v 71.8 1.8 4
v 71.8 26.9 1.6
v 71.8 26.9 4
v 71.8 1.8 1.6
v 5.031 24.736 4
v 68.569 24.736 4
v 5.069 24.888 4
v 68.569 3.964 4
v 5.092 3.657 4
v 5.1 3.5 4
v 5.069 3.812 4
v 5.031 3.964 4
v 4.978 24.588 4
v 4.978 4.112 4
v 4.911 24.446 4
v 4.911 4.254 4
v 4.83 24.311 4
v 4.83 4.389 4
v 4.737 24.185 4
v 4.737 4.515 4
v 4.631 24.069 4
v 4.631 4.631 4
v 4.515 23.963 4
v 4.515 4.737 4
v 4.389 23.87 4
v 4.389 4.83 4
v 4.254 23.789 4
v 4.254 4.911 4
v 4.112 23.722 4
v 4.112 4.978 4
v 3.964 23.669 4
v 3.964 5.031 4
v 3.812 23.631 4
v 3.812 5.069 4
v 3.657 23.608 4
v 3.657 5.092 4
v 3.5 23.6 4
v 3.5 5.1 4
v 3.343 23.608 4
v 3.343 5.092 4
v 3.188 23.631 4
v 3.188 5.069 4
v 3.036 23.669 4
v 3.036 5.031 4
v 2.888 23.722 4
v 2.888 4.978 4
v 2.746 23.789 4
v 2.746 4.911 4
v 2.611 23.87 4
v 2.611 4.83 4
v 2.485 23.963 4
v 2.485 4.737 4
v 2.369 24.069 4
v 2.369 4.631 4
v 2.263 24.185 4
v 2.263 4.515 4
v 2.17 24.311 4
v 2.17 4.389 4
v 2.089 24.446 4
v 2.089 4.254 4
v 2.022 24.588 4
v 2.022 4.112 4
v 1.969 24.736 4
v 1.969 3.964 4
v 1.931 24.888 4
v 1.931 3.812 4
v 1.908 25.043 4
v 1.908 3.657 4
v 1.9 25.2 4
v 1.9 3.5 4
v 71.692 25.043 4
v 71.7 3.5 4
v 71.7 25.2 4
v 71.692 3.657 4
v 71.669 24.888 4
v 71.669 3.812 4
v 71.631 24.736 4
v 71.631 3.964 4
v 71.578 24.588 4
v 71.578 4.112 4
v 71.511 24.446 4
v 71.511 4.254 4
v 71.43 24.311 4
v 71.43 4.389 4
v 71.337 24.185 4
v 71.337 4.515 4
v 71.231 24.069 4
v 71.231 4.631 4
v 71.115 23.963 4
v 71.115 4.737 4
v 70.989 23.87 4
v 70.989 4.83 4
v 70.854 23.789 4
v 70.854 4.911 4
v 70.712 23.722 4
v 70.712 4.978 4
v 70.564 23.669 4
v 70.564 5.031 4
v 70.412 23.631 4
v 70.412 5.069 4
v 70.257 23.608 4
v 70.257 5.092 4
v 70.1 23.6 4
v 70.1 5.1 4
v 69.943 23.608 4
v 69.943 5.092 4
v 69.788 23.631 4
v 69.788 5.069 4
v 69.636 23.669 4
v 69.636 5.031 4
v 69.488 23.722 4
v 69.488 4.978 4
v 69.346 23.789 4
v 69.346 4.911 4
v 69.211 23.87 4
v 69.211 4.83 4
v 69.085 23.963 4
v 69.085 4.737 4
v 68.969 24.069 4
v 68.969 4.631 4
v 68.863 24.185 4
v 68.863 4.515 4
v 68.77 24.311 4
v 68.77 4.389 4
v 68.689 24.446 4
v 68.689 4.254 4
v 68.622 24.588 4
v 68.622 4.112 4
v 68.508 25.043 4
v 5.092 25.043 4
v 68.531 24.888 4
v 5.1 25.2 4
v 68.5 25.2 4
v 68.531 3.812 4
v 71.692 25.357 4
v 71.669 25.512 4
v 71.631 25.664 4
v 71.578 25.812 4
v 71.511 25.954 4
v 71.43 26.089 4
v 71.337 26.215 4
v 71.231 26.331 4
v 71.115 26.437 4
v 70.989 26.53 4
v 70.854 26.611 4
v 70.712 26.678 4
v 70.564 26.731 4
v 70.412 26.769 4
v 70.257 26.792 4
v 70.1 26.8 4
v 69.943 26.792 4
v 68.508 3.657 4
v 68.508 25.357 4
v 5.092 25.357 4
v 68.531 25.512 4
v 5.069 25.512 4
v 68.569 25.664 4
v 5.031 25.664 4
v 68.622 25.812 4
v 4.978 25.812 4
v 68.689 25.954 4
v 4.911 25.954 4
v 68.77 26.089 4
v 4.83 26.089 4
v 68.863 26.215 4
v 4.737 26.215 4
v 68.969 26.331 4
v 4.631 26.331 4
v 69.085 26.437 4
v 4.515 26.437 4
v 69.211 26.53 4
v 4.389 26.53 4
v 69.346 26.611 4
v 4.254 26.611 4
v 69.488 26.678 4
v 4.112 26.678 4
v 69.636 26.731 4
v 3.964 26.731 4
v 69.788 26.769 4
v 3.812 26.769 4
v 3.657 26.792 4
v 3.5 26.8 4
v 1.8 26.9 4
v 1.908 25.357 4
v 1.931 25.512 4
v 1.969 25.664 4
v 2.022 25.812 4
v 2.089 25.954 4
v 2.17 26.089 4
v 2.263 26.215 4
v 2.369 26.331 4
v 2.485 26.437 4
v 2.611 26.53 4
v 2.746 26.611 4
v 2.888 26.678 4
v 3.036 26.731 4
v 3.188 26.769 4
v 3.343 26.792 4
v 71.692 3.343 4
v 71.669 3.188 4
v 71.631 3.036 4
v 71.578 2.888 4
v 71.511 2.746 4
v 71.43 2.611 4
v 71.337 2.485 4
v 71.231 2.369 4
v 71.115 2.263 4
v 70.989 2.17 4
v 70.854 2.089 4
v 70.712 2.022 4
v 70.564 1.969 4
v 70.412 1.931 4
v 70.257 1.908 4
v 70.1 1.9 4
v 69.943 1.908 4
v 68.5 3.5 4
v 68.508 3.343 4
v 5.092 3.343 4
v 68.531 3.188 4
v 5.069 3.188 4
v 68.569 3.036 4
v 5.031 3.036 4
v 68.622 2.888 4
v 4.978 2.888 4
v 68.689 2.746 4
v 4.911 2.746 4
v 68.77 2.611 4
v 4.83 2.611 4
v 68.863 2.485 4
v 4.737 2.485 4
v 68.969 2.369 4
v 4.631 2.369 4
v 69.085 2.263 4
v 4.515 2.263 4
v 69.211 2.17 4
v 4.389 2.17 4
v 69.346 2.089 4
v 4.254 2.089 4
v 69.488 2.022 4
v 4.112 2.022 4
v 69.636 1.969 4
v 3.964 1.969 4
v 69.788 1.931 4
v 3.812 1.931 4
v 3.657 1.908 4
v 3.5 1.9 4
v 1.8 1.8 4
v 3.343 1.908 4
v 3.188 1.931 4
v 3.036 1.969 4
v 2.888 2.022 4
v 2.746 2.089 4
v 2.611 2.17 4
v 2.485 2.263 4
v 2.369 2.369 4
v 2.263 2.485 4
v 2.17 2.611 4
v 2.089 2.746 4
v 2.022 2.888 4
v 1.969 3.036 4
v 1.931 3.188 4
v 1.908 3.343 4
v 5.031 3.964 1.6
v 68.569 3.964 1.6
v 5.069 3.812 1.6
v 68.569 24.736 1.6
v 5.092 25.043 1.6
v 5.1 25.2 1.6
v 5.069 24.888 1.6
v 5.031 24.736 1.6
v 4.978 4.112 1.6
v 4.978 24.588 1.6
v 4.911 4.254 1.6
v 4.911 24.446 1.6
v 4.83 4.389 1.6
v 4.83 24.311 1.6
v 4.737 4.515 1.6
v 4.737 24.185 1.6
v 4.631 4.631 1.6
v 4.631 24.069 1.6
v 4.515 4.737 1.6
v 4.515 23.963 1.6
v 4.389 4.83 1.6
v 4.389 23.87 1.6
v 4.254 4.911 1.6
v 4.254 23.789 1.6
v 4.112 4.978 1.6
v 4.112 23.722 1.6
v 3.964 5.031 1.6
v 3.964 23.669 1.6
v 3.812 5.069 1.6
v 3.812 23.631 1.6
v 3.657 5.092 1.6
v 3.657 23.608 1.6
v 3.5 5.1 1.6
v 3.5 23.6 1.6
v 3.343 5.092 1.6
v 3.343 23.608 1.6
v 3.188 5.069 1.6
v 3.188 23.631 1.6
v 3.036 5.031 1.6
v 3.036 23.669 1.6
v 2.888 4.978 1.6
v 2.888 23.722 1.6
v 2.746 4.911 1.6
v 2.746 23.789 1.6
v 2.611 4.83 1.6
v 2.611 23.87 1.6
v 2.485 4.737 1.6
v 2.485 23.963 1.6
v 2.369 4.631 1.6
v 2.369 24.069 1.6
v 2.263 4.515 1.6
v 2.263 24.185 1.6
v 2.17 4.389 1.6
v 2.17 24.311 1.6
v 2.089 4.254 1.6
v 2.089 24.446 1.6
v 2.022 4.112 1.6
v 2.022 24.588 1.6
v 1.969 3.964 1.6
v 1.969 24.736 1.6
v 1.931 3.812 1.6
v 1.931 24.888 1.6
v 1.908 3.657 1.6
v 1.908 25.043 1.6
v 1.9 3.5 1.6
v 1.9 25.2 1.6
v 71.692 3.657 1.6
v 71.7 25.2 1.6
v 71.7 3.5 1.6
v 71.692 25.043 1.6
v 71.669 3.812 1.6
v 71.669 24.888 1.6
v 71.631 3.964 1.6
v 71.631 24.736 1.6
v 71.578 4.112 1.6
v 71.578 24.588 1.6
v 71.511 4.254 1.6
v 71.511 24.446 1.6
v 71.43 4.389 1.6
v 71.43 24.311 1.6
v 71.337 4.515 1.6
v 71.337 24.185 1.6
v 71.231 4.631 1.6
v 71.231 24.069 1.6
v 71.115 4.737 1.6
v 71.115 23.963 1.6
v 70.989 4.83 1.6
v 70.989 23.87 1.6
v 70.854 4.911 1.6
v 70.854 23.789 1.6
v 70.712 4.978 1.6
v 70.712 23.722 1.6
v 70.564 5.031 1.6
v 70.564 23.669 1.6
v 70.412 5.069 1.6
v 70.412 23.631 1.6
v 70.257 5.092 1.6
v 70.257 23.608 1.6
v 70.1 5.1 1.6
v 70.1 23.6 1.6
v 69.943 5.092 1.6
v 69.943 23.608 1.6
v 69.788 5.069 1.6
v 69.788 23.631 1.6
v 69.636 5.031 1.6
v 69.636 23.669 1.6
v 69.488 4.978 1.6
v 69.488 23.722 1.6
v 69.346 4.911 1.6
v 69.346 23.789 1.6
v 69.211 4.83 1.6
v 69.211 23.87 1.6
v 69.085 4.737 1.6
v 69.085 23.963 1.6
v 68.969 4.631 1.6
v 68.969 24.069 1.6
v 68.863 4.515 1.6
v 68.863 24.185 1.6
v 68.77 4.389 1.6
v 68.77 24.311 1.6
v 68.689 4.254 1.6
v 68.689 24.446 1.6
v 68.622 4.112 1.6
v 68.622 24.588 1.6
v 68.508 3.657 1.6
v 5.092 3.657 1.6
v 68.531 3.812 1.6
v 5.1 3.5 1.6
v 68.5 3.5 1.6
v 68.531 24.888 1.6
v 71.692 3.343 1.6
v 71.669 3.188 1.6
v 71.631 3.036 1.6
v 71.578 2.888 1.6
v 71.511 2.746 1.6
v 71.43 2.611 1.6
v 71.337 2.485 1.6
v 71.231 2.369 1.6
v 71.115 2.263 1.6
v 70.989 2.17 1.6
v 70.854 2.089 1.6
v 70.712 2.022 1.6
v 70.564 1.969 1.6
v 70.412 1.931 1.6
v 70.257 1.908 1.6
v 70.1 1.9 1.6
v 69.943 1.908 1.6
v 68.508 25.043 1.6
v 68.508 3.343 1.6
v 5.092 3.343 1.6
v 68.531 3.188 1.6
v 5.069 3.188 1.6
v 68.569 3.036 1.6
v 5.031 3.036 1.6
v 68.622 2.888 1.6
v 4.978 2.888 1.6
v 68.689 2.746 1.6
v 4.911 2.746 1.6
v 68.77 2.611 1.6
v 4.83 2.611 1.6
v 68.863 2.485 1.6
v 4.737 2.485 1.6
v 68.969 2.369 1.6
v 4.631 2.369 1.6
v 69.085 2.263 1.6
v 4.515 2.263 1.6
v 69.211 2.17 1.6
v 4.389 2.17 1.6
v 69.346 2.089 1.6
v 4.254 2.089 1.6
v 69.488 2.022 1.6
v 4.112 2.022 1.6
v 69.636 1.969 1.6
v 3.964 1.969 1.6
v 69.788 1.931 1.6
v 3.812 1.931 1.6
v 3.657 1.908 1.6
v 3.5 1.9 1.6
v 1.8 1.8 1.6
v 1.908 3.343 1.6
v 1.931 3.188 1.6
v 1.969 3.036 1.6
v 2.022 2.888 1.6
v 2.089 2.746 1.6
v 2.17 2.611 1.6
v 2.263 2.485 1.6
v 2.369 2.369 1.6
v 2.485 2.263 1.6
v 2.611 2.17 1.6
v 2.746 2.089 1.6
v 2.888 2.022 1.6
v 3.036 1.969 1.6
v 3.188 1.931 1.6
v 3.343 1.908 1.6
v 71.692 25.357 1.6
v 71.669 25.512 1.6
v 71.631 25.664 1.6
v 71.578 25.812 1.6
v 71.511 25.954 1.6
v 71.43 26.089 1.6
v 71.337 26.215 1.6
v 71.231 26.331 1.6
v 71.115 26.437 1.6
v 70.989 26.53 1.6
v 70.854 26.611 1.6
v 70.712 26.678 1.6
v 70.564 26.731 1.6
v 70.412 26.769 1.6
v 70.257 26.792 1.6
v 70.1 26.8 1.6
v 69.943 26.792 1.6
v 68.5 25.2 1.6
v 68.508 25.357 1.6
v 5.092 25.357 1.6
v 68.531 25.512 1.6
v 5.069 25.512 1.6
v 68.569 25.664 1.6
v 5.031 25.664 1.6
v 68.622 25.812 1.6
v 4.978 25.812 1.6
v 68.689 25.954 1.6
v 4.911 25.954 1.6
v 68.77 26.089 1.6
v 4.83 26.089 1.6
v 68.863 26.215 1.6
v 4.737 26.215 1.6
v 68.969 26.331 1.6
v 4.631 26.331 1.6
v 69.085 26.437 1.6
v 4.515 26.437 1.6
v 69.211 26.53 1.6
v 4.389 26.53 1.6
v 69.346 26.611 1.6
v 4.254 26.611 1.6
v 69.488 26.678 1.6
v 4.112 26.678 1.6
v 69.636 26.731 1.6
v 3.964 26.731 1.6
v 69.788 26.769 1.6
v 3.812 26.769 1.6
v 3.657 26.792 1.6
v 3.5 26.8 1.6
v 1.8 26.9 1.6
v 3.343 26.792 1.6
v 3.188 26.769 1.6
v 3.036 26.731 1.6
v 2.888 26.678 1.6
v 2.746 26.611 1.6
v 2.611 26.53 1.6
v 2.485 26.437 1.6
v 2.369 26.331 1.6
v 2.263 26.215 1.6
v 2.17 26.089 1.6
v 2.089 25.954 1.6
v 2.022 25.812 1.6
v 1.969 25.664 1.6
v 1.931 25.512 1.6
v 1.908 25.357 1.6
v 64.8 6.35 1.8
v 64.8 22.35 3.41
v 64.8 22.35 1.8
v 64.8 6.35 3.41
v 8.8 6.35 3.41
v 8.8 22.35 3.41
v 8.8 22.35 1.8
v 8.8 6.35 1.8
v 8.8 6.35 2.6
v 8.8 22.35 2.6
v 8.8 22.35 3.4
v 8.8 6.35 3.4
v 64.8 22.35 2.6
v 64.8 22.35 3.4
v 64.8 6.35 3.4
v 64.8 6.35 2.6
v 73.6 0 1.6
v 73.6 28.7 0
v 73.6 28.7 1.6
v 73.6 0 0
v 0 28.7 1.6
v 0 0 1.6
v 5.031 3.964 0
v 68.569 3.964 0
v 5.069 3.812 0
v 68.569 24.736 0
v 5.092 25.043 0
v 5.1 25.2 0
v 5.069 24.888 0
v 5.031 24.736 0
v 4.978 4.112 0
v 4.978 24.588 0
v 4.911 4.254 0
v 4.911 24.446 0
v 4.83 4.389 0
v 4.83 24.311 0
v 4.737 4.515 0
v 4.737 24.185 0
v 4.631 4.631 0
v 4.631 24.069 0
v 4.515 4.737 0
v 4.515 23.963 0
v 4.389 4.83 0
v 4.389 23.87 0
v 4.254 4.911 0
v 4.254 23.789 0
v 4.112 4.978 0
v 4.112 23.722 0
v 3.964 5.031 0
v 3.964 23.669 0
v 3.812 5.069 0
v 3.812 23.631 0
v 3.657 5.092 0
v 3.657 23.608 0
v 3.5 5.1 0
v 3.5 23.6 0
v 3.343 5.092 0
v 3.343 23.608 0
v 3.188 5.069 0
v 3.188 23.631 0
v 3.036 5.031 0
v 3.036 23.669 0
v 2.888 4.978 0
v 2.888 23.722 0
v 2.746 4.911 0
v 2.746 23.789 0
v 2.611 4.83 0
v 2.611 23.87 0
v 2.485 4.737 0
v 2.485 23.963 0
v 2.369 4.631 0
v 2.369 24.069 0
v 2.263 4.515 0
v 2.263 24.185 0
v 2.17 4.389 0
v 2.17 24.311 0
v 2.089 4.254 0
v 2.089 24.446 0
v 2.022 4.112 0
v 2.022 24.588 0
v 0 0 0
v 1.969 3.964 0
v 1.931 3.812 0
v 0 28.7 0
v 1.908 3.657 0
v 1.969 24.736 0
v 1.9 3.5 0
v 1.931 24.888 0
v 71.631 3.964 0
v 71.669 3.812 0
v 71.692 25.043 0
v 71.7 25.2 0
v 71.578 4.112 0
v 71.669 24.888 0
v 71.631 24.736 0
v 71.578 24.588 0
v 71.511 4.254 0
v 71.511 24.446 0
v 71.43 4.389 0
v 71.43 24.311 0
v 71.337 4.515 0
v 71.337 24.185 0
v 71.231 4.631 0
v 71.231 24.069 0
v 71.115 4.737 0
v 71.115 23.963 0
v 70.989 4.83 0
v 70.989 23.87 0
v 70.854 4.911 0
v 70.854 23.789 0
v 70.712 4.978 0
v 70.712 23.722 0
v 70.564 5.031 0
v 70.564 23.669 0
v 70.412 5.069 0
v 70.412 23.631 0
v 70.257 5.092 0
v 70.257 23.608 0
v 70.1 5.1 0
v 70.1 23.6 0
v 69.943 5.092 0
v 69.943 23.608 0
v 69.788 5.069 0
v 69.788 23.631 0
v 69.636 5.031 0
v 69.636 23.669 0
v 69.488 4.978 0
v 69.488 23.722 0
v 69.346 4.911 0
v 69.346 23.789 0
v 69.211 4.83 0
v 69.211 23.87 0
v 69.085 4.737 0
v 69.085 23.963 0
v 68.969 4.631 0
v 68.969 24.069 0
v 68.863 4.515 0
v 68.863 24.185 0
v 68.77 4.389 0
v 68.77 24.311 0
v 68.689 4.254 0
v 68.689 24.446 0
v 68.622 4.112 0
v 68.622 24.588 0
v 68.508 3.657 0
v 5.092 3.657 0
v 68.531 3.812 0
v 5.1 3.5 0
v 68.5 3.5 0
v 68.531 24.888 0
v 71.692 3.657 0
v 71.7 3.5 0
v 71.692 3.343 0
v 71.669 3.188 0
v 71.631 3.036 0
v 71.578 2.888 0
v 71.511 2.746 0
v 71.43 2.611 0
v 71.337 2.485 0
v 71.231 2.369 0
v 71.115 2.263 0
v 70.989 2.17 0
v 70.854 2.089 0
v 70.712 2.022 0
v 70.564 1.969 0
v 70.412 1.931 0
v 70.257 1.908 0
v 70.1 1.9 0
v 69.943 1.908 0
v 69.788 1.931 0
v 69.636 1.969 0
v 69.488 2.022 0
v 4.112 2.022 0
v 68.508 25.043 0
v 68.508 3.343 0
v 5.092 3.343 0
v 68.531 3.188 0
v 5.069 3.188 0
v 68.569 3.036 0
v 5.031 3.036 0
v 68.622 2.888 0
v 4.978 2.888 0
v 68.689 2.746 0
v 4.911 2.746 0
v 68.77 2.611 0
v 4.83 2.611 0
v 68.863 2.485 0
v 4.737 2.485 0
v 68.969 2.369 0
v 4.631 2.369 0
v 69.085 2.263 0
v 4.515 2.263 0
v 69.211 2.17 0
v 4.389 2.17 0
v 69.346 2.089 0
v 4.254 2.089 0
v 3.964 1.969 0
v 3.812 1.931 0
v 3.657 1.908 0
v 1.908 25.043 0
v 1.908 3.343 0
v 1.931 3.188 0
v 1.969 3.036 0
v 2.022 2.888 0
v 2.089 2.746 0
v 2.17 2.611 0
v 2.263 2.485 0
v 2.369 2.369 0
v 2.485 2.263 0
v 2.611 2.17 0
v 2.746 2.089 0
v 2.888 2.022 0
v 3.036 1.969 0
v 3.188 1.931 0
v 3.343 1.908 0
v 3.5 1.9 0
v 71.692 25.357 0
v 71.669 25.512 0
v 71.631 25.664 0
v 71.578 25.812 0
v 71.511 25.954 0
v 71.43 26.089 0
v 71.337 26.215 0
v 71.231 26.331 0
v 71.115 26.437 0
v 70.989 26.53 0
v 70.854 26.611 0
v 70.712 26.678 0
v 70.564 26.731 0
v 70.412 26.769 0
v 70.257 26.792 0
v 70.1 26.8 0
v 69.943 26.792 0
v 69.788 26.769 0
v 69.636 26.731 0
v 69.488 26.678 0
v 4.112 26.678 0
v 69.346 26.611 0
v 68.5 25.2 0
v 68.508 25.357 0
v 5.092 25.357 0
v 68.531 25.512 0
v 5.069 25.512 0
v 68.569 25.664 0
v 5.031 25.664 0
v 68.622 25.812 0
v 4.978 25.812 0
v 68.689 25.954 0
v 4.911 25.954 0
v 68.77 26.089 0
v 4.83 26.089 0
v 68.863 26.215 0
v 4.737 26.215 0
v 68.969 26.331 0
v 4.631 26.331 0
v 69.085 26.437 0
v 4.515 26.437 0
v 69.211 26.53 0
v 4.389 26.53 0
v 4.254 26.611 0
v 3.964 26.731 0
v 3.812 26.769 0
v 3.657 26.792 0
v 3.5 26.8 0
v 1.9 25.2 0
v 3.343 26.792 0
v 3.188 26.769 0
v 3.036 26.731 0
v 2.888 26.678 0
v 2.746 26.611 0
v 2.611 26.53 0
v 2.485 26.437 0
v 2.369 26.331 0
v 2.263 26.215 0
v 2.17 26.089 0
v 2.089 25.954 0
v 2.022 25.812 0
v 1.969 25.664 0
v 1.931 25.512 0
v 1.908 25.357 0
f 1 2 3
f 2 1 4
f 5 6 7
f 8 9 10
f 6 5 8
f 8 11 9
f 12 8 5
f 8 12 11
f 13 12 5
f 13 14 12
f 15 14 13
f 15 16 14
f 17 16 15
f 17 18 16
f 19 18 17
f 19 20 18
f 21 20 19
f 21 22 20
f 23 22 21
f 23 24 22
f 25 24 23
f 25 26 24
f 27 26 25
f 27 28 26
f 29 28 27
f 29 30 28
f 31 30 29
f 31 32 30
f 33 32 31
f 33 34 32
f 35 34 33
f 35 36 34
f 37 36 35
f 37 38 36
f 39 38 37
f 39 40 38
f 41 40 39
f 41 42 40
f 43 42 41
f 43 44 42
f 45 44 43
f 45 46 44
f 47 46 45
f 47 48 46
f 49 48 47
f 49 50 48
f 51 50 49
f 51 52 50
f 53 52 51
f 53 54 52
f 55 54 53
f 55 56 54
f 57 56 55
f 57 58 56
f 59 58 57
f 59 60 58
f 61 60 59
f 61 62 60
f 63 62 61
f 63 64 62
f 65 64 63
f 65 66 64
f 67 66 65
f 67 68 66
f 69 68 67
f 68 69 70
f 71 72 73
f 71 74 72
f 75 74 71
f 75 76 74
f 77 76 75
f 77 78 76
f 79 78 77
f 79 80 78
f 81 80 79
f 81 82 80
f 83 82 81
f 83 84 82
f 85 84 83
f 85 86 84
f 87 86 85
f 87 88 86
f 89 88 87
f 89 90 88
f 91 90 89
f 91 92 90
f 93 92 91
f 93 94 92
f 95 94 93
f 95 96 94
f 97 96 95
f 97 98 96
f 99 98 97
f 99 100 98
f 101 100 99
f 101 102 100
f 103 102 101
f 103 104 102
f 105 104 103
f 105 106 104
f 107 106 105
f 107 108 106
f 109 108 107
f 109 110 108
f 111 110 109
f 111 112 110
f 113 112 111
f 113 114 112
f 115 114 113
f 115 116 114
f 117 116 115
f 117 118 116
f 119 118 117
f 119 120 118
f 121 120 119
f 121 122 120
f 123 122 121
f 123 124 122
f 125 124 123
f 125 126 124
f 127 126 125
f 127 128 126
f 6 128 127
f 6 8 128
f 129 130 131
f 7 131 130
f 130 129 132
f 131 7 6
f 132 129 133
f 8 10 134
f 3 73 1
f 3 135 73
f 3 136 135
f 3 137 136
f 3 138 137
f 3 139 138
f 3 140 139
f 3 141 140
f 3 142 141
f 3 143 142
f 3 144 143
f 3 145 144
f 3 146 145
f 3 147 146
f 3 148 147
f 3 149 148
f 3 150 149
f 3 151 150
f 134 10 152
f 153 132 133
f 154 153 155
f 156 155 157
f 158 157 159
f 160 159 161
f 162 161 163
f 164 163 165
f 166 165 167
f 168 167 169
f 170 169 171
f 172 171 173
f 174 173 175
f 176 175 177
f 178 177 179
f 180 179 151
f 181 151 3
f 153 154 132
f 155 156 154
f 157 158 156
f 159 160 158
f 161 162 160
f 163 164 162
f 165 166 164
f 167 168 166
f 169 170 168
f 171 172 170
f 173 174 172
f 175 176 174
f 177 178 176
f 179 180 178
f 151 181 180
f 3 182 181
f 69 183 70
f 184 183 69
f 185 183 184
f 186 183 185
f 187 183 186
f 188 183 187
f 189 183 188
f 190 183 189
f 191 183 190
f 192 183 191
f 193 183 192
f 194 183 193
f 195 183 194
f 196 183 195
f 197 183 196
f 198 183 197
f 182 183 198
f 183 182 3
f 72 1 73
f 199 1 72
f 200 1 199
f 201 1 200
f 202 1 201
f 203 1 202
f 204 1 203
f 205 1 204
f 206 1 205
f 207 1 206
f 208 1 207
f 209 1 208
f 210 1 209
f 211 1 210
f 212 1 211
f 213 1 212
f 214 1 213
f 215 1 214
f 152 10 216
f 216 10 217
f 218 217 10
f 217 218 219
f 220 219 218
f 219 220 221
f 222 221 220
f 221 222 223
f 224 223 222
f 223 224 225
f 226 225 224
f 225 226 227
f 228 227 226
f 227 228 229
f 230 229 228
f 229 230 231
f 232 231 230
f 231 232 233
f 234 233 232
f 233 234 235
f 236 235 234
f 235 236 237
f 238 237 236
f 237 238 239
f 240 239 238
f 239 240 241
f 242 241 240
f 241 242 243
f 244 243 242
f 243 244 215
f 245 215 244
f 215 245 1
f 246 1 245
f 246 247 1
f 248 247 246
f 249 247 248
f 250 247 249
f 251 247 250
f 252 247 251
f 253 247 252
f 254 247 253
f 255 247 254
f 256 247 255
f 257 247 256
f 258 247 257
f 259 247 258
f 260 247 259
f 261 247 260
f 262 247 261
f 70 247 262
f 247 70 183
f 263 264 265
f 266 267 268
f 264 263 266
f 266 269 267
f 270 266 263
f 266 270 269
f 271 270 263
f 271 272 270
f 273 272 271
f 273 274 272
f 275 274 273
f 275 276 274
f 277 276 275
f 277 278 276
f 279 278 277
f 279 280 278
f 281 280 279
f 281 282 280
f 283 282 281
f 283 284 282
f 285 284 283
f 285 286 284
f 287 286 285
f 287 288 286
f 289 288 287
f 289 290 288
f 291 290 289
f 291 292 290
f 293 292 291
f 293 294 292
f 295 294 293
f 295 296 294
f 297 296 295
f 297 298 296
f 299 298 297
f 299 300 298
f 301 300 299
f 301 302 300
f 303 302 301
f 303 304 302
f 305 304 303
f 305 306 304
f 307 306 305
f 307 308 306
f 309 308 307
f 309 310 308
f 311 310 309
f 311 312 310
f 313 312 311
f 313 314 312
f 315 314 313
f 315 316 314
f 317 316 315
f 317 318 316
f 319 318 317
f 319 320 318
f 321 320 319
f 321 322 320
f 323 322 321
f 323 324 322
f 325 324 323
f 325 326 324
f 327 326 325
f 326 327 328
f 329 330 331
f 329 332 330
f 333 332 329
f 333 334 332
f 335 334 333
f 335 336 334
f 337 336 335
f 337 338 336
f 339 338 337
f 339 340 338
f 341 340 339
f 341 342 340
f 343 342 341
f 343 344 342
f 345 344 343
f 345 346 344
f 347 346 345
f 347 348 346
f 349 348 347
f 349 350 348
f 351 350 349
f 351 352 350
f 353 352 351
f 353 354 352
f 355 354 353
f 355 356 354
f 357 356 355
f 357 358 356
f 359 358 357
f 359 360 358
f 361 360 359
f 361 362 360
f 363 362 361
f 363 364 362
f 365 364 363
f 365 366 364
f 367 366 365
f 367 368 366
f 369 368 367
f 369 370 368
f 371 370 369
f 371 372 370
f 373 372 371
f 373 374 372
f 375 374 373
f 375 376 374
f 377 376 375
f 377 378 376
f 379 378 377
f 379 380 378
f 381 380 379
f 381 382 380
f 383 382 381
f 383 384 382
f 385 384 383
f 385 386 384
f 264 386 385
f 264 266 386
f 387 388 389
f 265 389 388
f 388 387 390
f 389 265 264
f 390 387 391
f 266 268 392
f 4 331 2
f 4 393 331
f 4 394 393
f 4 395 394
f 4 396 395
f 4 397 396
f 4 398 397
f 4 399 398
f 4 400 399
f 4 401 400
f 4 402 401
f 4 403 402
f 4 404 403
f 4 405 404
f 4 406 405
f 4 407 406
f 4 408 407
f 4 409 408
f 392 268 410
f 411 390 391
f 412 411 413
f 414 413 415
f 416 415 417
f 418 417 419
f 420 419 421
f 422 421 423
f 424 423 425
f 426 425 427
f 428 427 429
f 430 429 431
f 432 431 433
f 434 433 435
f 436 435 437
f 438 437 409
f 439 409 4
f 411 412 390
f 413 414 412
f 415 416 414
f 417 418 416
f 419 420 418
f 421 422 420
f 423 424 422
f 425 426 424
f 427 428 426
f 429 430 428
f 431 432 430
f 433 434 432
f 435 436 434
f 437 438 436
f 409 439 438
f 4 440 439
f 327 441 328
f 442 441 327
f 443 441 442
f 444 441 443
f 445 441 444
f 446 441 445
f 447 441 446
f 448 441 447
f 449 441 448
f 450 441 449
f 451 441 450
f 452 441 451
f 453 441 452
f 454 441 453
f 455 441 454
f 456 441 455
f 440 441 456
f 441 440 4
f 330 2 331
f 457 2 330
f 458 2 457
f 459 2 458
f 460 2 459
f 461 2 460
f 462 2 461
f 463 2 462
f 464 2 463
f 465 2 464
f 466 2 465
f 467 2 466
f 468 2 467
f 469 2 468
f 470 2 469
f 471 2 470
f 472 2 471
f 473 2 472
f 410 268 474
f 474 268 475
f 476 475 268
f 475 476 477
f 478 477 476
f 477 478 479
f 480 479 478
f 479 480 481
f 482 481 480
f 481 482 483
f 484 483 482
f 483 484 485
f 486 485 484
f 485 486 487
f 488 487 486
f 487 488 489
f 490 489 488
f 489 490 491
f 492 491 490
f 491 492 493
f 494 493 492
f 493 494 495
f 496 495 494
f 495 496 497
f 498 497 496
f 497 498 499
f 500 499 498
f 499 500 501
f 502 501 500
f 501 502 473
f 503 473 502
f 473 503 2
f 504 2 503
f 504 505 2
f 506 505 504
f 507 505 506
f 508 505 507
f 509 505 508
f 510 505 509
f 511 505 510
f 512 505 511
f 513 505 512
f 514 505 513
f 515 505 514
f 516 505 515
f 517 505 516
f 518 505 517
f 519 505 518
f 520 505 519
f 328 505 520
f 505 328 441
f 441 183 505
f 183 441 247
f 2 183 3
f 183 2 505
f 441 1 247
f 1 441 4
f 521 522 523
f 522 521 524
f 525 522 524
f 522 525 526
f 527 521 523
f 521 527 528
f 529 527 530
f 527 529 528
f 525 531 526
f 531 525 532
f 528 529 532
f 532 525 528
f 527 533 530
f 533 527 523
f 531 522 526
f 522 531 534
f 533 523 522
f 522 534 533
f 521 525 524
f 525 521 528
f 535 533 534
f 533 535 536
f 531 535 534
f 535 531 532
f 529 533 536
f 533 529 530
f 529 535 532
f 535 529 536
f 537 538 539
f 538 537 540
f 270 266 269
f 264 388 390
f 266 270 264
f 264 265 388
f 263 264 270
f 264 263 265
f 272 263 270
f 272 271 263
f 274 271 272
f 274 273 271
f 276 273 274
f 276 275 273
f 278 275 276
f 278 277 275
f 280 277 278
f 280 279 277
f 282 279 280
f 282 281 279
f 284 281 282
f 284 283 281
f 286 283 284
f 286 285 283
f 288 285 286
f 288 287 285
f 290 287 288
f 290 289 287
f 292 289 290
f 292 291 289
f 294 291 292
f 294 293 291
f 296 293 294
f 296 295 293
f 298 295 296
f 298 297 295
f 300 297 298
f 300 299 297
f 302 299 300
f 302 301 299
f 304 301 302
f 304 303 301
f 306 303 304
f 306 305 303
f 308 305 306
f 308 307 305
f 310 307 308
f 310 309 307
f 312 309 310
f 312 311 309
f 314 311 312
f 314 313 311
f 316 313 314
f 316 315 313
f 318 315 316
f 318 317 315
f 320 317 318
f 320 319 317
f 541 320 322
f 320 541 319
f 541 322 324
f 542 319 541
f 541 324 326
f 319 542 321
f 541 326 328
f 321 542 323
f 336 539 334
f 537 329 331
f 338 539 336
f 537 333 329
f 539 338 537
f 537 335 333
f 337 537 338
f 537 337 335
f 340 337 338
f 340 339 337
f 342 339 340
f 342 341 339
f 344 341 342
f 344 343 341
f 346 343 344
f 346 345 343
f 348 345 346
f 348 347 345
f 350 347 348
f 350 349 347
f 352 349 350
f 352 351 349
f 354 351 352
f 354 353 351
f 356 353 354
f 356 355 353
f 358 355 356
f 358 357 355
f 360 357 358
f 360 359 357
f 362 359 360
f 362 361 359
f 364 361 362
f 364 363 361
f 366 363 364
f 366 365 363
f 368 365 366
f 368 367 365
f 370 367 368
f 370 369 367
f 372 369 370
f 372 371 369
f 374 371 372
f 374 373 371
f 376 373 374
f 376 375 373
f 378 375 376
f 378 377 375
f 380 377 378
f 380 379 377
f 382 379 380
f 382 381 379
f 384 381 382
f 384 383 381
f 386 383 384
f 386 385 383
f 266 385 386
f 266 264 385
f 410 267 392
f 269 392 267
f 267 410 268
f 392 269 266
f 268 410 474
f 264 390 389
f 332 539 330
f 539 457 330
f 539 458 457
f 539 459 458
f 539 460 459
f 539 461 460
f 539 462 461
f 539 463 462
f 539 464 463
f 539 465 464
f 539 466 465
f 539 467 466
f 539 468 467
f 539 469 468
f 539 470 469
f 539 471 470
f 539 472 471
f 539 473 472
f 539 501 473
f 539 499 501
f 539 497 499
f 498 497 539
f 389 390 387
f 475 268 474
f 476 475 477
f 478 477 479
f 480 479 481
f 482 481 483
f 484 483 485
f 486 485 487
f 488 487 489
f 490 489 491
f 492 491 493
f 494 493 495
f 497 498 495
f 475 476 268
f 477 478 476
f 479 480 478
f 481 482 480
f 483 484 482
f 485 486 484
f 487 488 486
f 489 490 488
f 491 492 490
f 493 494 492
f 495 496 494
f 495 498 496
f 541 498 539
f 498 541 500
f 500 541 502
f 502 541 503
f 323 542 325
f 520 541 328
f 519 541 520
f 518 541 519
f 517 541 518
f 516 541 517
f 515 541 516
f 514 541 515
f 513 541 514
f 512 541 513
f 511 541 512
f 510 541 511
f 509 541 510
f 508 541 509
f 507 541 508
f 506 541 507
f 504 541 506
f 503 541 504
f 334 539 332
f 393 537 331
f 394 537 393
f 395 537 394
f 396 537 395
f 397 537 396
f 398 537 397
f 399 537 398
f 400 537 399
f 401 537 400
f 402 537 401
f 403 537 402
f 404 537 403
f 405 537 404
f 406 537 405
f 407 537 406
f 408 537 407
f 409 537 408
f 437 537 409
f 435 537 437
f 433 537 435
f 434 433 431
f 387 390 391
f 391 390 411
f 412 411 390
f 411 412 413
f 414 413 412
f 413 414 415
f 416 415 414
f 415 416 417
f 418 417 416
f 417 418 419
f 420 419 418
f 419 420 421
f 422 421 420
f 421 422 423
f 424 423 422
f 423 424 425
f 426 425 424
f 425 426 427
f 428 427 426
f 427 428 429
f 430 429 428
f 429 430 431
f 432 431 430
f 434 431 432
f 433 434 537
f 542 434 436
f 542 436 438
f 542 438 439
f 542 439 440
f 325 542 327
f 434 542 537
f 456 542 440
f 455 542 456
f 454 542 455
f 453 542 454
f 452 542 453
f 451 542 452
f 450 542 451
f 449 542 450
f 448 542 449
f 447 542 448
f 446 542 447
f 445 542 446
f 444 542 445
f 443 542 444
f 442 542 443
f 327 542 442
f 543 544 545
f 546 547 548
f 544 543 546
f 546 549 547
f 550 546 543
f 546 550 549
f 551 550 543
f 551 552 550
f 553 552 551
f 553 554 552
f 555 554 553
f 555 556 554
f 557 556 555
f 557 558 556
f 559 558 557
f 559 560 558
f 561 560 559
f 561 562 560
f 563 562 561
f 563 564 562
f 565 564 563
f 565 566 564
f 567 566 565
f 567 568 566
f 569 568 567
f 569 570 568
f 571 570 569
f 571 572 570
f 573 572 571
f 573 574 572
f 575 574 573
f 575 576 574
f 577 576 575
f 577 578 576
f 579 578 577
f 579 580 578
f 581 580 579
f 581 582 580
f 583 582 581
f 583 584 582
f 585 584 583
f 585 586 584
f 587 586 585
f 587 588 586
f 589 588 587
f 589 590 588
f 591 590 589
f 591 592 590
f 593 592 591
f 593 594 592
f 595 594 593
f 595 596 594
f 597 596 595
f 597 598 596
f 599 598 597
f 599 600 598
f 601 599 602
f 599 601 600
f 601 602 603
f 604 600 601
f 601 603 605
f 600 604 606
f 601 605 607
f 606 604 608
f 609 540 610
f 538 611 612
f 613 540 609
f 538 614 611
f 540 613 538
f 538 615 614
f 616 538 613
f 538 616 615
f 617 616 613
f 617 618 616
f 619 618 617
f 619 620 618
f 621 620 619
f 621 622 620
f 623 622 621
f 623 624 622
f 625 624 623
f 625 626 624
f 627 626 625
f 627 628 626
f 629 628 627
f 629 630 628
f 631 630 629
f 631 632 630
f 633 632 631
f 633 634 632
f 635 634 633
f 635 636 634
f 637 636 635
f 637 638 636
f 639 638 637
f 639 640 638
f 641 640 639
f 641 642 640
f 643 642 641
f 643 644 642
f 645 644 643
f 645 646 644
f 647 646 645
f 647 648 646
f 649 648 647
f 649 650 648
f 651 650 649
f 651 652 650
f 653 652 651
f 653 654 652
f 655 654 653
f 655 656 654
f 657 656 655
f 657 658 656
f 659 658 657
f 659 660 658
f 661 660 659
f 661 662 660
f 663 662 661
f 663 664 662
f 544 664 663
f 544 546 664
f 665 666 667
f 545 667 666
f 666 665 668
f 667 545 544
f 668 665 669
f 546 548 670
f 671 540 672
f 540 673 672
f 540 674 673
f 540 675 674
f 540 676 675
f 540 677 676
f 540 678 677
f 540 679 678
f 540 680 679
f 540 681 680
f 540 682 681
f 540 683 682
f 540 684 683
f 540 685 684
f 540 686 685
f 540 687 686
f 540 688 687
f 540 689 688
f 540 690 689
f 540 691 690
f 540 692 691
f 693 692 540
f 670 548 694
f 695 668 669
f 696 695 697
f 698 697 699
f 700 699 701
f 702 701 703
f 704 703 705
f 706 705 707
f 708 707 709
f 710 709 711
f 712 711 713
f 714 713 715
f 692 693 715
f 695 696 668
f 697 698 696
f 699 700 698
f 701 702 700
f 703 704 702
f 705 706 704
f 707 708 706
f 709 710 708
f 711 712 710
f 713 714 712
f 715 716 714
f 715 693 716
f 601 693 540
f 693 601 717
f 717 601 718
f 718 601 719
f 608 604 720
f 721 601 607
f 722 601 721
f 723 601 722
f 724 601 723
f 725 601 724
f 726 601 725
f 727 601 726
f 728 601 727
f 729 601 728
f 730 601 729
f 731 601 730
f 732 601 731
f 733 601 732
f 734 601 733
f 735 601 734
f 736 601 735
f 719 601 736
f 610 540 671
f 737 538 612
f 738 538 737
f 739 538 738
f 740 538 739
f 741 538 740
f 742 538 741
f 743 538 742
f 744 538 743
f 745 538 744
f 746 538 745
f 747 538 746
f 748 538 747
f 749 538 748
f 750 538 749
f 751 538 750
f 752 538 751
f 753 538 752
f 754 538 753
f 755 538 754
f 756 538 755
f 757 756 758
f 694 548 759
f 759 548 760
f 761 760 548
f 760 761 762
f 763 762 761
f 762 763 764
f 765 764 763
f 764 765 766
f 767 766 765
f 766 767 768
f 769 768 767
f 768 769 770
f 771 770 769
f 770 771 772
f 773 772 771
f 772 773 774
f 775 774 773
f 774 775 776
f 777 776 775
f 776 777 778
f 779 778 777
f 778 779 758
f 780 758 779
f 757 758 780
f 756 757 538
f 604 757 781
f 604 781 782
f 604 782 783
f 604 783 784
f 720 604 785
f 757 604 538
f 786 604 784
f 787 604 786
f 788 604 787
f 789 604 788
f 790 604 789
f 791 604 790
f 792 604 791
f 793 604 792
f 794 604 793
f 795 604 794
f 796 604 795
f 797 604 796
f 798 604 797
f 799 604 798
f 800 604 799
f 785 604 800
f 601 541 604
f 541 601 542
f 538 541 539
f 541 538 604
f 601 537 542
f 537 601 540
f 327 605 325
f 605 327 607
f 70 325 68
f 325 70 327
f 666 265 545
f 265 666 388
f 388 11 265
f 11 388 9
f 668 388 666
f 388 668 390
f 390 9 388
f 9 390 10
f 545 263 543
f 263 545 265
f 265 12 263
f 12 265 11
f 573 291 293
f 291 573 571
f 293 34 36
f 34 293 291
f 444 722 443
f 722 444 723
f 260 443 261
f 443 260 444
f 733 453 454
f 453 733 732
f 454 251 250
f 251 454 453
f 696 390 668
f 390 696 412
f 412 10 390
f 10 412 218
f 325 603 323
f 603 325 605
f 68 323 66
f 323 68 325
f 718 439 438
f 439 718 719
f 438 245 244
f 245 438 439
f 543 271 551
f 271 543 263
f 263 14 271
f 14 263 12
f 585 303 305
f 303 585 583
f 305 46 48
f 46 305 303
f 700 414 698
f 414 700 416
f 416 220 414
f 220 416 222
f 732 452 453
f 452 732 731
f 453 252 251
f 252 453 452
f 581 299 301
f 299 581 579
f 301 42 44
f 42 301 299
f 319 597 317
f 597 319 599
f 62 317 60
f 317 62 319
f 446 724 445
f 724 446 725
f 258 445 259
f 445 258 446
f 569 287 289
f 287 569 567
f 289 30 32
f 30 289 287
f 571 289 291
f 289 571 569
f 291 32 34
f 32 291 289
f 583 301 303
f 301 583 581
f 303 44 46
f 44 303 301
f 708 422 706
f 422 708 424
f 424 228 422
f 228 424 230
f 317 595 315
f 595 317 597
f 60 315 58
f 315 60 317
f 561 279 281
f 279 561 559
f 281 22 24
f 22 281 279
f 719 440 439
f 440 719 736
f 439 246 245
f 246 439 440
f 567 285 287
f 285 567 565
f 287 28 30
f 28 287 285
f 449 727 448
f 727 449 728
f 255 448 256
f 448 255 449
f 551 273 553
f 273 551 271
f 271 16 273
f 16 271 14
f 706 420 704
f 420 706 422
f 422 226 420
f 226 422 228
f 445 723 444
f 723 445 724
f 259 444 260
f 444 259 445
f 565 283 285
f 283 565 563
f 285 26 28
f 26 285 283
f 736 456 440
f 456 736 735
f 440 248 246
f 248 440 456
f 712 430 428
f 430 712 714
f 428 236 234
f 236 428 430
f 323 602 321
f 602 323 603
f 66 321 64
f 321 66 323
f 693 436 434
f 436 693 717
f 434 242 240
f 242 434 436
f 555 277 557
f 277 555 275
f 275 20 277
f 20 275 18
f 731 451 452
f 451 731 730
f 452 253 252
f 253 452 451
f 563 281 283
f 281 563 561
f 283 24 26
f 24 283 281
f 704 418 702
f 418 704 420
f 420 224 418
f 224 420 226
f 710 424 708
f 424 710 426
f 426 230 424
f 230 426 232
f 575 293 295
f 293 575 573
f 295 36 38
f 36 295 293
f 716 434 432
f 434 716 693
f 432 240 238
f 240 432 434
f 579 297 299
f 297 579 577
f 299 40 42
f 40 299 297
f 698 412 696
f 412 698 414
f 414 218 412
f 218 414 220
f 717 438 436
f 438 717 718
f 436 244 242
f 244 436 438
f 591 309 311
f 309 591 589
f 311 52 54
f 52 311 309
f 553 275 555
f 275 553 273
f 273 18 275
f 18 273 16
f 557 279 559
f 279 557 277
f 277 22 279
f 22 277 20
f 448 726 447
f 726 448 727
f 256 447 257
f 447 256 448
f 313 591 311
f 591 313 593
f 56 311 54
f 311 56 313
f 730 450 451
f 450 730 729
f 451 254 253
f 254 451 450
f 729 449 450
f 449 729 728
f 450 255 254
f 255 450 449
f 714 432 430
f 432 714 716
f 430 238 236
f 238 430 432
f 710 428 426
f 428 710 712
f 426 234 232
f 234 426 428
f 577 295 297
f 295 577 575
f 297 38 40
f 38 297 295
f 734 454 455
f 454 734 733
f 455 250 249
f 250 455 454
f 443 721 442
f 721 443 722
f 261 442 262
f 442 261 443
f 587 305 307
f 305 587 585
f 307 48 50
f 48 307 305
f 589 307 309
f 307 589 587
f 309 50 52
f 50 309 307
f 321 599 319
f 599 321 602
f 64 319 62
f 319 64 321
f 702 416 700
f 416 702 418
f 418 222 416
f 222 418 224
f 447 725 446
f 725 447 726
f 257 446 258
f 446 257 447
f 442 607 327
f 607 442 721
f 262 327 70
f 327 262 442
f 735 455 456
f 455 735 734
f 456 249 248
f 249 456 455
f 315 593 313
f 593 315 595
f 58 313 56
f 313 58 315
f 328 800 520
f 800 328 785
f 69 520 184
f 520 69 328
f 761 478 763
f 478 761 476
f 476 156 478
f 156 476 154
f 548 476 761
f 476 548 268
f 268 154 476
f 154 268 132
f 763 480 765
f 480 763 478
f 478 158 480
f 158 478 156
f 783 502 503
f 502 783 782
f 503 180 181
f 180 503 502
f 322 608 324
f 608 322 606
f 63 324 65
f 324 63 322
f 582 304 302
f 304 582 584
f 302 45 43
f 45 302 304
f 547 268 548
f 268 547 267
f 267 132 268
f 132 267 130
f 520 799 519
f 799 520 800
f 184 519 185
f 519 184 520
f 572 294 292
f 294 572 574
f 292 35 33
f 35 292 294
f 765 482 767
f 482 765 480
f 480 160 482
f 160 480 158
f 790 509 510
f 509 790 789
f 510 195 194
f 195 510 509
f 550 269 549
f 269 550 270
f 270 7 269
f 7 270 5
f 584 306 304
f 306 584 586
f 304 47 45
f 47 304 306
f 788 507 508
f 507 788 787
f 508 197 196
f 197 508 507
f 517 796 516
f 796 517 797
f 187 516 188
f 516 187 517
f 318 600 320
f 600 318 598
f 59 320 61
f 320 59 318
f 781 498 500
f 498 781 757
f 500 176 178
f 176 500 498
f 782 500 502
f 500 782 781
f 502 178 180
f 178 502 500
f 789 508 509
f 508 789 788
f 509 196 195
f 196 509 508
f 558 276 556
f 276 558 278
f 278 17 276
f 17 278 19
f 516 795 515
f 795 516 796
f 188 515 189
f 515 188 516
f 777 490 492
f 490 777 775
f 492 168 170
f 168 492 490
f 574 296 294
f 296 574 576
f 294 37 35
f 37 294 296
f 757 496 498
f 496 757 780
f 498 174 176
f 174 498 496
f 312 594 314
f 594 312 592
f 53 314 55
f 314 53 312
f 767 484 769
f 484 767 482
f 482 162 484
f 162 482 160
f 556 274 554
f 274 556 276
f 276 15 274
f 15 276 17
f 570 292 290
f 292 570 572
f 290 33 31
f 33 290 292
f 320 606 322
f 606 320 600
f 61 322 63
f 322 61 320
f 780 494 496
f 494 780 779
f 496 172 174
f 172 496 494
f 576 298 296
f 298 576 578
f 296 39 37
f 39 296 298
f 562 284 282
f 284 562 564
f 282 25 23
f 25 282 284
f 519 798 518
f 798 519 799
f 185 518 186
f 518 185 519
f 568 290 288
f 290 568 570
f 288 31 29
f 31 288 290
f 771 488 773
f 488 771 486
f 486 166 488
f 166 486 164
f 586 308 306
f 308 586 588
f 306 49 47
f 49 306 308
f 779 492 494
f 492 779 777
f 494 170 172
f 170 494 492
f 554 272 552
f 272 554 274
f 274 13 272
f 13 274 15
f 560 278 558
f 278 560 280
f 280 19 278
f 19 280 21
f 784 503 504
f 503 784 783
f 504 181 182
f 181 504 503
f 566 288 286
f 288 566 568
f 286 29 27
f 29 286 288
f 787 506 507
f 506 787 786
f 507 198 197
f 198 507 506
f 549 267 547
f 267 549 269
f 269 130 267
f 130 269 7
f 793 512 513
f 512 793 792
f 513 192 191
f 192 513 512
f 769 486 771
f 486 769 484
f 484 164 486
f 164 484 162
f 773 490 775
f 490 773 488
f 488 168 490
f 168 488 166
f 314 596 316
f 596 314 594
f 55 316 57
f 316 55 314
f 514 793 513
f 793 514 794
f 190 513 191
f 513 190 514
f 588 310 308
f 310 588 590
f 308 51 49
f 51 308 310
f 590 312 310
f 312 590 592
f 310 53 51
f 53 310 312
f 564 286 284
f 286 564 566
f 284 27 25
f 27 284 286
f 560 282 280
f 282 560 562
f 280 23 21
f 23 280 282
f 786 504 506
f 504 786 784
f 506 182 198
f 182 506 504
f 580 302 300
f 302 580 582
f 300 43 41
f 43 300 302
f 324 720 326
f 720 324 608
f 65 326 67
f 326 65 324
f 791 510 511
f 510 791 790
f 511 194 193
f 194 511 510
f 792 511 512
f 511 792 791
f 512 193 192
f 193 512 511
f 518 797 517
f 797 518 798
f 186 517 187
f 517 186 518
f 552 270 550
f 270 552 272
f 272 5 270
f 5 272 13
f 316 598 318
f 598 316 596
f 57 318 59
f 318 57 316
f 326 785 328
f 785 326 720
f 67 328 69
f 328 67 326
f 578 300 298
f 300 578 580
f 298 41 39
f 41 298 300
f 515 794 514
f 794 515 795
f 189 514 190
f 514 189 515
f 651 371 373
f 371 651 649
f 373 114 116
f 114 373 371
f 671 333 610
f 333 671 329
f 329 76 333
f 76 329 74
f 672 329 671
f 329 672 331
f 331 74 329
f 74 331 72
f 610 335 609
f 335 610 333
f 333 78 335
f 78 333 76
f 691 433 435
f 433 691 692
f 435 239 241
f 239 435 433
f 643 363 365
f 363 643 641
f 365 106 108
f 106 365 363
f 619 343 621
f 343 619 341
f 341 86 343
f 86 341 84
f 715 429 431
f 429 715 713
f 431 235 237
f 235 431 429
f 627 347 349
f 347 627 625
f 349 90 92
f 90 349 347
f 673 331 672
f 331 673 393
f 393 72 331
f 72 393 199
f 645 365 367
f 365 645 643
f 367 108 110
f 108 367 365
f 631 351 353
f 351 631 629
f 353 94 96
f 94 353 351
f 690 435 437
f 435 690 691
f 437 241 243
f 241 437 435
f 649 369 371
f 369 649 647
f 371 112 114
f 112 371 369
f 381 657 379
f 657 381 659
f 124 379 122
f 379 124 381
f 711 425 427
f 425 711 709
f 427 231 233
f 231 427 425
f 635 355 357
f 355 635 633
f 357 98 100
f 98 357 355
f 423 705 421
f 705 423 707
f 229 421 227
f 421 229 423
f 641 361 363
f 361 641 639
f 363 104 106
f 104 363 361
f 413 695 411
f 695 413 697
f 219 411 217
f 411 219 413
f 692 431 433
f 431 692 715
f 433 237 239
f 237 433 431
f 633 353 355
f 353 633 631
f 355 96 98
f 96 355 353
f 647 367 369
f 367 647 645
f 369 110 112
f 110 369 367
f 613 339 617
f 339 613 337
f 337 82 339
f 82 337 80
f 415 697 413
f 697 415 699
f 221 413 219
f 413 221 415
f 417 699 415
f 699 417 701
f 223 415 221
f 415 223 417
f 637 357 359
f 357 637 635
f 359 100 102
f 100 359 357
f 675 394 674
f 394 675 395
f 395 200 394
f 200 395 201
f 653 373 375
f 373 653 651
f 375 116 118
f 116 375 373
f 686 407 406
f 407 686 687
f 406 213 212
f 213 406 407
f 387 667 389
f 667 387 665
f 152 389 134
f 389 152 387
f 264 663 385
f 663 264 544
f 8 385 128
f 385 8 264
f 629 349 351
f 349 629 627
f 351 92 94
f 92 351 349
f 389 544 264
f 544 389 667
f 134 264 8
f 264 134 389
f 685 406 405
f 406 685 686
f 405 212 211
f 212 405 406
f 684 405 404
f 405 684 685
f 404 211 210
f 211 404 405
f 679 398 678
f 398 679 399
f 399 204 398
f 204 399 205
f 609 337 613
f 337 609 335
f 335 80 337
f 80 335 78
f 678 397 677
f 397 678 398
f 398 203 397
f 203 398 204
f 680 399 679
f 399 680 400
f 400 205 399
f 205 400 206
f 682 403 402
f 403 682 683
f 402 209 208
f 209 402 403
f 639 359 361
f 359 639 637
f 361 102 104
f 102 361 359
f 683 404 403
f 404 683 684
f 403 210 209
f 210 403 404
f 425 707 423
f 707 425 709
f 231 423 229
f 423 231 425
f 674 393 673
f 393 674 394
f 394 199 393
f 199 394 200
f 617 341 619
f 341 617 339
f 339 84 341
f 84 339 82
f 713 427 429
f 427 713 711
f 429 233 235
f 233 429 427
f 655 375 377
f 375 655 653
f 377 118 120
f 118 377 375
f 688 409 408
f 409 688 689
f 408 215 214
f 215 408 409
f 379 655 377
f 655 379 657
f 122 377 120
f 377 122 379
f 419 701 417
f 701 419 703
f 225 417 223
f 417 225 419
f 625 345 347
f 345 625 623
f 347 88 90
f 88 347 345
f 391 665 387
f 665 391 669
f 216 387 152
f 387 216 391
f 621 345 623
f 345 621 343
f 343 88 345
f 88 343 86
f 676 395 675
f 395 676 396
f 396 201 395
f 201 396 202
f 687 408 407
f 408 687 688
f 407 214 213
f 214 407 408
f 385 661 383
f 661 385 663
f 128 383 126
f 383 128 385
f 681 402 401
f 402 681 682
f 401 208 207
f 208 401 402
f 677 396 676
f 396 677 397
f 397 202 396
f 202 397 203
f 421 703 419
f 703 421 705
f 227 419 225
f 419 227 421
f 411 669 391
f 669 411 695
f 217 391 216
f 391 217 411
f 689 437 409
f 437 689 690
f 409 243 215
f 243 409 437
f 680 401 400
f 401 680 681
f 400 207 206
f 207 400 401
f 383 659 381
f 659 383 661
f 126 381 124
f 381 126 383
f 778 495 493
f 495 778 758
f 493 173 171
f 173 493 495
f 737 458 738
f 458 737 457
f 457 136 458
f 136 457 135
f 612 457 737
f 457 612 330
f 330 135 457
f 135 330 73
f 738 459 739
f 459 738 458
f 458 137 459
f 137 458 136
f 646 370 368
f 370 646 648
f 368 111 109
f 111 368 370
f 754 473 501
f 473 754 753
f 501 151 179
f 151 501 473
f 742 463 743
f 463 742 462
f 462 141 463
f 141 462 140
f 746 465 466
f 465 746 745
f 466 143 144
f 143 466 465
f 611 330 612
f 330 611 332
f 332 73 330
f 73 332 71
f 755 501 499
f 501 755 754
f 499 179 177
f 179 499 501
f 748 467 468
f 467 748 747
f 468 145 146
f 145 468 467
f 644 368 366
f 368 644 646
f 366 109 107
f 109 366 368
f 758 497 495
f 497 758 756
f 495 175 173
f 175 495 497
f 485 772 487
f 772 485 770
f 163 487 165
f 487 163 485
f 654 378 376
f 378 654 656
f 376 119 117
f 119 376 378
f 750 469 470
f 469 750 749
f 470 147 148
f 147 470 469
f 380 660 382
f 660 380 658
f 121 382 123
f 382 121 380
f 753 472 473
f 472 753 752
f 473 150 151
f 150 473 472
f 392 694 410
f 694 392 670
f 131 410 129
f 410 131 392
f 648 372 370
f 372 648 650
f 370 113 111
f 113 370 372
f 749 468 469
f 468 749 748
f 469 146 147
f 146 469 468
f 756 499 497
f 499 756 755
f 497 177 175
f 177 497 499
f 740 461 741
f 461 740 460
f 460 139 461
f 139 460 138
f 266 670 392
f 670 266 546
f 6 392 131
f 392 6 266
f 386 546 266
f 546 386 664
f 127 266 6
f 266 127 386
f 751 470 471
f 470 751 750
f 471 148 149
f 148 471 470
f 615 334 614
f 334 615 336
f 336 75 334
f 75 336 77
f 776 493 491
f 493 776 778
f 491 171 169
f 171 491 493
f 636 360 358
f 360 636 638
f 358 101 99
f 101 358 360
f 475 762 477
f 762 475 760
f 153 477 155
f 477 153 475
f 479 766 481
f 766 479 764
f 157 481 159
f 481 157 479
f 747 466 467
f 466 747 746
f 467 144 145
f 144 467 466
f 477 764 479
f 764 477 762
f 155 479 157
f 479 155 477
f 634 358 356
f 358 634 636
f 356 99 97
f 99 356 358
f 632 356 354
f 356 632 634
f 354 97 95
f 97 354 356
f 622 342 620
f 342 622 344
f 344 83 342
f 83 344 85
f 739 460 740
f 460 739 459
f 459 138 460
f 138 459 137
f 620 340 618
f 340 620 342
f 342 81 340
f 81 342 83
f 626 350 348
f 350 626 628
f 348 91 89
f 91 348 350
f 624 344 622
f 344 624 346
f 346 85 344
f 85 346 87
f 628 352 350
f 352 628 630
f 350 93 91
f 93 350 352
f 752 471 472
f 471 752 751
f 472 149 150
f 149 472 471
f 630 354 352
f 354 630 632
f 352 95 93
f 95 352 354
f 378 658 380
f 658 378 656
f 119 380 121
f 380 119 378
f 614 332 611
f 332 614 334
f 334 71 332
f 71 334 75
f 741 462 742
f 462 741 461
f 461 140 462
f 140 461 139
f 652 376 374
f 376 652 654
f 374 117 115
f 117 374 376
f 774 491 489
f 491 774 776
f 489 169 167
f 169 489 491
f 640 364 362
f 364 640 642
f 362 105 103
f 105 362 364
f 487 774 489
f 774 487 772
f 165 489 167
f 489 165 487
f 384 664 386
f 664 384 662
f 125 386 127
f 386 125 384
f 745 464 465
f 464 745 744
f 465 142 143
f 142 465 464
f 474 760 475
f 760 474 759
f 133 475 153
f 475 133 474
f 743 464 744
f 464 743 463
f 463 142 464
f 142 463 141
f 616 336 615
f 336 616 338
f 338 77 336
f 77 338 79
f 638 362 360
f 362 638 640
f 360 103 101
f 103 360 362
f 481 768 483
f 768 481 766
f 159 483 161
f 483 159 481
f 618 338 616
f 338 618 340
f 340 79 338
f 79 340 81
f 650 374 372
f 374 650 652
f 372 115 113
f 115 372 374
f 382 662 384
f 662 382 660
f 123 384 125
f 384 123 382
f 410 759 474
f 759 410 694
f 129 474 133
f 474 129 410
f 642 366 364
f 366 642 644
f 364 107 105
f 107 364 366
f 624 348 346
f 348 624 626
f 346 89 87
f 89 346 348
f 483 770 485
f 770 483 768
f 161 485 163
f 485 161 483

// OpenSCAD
$fn=64;

// LCD Display Module S-7282B (approximate)
// Overall: 73.6mm x 28.7mm
// Includes: PCB, bezel/frame, viewing window, 4 mounting holes

module lcd_s7282b(
    pcb_len=73.6,
    pcb_wid=28.7,
    pcb_thk=1.6,

    bezel_margin=1.8,
    bezel_thk=2.4,

    window_len=56.0,
    window_wid=16.0,
    window_inset=0.6,   // how far down the window recess starts from bezel top
    window_depth=1.6,   // recess depth into bezel

    hole_d=3.2,
    hole_edge_x=3.5,    // hole center offset from left/right edge
    hole_edge_y=3.5     // hole center offset from bottom/top edge
){
    module pcb(){
        color([0.05,0.35,0.12])
            cube([pcb_len, pcb_wid, pcb_thk], center=false);
    }

    module bezel(){
        // Bezel sits on top of PCB, centered
        bezel_len = pcb_len - 2*bezel_margin;
        bezel_wid = pcb_wid - 2*bezel_margin;

        translate([bezel_margin, bezel_margin, pcb_thk])
        difference(){
            color([0.08,0.08,0.08])
                cube([bezel_len, bezel_wid, bezel_thk], center=false);

            // Viewing window recess
            translate([(bezel_len-window_len)/2, (bezel_wid-window_wid)/2, bezel_thk - window_inset - window_depth])
                cube([window_len, window_wid, window_depth + 0.01], center=false);
        }

        // "Glass" in the window (slightly below top surface)
        translate([bezel_margin + (bezel_len-window_len)/2,
                   bezel_margin + (bezel_wid-window_wid)/2,
                   pcb_thk + bezel_thk - window_inset - 0.8])
            color([0.15,0.25,0.35, 0.6])
                cube([window_len, window_wid, 0.8], center=false);
    }

    module holes(){
        for (sx=[hole_edge_x, pcb_len-hole_edge_x])
            for (sy=[hole_edge_y, pcb_wid-hole_edge_y])
                translate([sx, sy, -0.1])
                    cylinder(d=hole_d, h=pcb_thk + bezel_thk + 0.2);
    }

    difference(){
        union(){
            pcb();
            bezel();

            // Simple connector pad area (approx) on back edge
            translate([pcb_len-18, (pcb_wid-10)/2, 0])
                color([0.75,0.65,0.15])
                    cube([16, 10, 0.2], center=false);
        }
        holes();
    }
}

lcd_s7282b();
